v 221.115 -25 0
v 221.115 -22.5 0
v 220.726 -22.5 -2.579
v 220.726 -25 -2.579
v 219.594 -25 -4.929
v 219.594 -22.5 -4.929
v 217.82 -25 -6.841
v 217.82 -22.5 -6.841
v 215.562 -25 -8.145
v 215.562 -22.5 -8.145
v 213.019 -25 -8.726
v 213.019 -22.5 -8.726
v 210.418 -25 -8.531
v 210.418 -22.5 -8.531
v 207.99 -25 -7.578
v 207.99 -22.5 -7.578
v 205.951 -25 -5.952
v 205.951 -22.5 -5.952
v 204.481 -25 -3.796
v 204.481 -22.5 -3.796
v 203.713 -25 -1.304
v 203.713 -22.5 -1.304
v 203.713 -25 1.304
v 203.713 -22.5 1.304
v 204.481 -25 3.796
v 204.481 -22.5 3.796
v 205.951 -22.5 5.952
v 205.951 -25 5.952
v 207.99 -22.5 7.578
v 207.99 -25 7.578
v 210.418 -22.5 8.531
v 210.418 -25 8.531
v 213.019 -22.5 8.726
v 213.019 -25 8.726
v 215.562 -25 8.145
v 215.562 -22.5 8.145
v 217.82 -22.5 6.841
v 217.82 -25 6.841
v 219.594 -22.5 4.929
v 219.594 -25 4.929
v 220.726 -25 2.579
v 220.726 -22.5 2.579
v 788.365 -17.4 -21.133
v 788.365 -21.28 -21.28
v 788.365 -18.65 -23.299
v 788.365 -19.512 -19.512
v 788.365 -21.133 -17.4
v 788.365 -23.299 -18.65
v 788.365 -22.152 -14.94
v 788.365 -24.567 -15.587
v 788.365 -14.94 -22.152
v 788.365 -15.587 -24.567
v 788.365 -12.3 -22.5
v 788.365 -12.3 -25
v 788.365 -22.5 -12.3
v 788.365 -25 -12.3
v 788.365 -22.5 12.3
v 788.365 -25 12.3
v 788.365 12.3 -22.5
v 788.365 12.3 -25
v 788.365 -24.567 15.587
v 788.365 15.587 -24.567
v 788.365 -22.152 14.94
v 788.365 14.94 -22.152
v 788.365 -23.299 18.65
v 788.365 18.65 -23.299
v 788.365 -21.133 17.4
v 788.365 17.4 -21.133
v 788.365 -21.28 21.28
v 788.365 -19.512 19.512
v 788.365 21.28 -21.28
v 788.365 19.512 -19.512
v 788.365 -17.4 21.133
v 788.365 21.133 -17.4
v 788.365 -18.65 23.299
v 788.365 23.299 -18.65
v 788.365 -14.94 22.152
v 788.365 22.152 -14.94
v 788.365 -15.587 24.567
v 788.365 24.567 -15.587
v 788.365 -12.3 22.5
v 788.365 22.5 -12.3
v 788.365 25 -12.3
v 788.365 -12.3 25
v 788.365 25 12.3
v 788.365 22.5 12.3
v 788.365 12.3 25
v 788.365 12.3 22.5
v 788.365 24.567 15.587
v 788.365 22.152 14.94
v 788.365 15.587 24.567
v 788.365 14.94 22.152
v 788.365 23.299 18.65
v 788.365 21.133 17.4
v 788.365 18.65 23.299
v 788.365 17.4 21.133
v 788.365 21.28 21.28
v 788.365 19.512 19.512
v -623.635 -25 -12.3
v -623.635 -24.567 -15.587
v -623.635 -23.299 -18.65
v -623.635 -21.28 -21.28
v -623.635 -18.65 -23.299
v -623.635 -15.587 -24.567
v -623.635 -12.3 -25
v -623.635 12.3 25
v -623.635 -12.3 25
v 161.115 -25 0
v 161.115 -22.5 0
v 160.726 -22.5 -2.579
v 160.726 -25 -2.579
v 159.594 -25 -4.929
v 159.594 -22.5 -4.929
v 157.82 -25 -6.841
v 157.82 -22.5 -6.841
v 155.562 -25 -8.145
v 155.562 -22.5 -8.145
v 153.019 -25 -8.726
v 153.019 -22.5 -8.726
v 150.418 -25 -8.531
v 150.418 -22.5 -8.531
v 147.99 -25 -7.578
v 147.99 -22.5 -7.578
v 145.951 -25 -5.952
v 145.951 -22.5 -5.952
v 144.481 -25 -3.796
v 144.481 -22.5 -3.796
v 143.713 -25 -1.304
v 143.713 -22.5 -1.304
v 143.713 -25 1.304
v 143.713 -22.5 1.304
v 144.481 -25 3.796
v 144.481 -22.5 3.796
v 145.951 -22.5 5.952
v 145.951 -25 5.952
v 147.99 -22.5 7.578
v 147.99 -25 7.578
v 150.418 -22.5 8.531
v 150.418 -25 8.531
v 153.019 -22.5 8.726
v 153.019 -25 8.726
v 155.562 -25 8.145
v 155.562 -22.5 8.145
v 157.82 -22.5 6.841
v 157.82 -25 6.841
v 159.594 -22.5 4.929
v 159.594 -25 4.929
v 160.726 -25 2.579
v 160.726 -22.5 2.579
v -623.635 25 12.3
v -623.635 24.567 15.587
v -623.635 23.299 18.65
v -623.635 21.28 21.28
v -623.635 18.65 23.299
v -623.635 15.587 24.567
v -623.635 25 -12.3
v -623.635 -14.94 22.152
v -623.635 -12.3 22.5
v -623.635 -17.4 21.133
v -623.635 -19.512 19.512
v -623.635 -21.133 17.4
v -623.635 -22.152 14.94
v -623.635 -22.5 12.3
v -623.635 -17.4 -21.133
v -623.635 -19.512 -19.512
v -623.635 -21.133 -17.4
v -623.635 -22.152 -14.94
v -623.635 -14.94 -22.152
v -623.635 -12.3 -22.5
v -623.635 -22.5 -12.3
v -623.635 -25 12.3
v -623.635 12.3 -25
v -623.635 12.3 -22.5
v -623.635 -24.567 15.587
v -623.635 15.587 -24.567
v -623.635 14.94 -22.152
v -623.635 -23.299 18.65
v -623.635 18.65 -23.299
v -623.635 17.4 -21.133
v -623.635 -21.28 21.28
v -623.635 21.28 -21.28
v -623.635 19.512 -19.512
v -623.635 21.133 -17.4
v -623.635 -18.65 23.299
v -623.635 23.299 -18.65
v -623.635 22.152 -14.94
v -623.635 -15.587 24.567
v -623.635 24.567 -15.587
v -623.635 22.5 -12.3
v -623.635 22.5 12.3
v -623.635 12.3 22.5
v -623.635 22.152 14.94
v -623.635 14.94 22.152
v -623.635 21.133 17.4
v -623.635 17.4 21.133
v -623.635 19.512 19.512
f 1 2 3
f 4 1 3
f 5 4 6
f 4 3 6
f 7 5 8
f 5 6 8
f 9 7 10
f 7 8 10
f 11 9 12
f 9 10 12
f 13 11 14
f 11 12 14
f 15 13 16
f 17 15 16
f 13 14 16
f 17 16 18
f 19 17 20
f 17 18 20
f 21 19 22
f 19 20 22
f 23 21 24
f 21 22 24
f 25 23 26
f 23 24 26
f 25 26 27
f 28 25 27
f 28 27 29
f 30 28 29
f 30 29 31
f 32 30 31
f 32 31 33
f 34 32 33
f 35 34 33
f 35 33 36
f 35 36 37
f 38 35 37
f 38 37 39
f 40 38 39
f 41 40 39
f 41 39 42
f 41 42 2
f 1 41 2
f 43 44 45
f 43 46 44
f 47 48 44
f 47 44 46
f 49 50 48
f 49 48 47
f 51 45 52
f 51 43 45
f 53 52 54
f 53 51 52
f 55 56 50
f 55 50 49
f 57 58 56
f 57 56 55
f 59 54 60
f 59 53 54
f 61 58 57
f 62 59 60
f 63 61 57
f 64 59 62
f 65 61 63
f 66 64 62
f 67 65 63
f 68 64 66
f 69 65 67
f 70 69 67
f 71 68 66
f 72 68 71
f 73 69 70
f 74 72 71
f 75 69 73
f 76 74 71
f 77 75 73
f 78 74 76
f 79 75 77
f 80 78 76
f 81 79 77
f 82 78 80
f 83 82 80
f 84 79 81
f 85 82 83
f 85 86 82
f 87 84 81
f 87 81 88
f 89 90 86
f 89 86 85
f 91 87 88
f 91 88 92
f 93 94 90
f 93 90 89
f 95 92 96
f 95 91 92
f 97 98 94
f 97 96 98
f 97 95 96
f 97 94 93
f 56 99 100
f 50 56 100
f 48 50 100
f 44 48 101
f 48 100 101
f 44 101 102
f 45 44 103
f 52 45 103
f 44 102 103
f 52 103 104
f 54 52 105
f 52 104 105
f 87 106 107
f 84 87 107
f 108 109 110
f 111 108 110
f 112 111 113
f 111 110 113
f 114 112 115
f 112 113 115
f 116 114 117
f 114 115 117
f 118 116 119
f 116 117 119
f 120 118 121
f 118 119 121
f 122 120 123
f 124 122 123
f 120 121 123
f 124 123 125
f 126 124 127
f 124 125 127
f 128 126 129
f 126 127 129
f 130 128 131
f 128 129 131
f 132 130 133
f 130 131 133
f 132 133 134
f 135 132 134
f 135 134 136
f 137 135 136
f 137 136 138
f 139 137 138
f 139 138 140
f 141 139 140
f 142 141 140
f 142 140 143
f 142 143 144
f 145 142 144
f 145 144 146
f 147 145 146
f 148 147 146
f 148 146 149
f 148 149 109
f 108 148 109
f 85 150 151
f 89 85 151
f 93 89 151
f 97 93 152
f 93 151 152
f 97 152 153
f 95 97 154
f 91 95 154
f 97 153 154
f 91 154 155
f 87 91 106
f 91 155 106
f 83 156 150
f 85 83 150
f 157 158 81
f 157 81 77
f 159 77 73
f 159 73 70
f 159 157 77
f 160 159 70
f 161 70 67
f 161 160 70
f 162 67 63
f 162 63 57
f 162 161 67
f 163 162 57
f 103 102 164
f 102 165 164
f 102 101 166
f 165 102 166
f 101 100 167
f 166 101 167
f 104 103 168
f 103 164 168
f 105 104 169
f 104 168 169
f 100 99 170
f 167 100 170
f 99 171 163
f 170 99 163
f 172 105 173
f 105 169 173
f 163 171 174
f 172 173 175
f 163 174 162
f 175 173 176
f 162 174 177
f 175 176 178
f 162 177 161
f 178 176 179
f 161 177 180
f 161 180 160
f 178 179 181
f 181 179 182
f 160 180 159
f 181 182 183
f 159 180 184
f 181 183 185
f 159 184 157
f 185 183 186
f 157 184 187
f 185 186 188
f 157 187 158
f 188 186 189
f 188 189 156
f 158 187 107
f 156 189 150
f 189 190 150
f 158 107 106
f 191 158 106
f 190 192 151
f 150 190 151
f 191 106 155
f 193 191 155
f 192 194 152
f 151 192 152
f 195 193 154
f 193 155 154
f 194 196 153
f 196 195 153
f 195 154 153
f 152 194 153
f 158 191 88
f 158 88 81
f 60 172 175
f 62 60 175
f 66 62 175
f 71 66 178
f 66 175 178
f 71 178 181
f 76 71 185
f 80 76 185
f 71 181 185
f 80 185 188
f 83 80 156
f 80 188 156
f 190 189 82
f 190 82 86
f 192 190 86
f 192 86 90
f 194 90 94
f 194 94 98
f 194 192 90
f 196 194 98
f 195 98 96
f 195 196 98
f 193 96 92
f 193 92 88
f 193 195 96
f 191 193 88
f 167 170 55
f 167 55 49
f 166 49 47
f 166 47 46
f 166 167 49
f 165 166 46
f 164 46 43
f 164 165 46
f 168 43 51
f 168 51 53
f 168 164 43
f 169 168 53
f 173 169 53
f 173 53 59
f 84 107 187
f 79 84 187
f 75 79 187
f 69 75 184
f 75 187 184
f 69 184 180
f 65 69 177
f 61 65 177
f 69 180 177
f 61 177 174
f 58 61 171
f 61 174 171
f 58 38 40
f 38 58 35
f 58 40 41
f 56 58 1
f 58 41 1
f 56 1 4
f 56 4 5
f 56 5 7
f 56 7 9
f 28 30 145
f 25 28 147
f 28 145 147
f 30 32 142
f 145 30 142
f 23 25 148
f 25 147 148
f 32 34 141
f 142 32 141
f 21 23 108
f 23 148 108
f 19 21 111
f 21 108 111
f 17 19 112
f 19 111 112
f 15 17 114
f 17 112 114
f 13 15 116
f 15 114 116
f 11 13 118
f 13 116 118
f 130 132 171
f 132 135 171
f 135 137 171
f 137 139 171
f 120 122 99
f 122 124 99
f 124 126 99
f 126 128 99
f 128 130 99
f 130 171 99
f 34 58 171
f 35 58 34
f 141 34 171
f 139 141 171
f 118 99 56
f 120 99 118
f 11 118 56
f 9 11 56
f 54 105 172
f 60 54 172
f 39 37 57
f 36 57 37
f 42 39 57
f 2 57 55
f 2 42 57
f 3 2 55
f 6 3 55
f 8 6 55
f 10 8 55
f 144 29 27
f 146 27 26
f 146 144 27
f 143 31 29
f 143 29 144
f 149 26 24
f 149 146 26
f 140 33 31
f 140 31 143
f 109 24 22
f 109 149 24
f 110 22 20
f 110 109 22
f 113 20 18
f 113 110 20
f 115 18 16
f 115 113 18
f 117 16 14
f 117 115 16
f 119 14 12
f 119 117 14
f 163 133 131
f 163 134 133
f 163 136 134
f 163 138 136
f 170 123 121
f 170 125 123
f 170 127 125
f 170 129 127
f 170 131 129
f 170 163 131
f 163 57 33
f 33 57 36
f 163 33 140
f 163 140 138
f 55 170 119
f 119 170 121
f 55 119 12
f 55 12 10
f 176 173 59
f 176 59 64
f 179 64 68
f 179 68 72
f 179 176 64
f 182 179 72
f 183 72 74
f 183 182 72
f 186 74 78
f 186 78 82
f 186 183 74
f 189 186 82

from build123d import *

# Parameters (mm, degrees)
MIEMBRO_ESTRUCTURAL1_DEPTH        = 1412
TALADRO_DE_MARGEN_PARA_M161_D     = 17.5
TALADRO_DE_MARGEN_PARA_M161_DEPTH = 2.5


with BuildPart() as part:
    # Sketch1 → Miembro estructural1 (new body)
    with BuildSketch(Plane.YZ.offset(-623.635182539)):
        with BuildLine():
            Line((-12.3, -25), (12.3, -25))
            ThreePointArc((12.3, -25), (21.280256121, -21.280256121), (25, -12.3))
            Line((25, -12.3), (25, 12.3))
            ThreePointArc((25, 12.3), (21.280256121, 21.280256121), (12.3, 25))
            Line((12.3, 25), (-12.3, 25))
            ThreePointArc((-12.3, 25), (-21.280256121, 21.280256121), (-25, 12.3))
            Line((-25, 12.3), (-25, -12.3))
            ThreePointArc((-25, -12.3), (-21.280256121, -21.280256121), (-12.3, -25))
        make_face()
        with BuildLine():
            Line((-12.3, -22.5), (12.3, -22.5))
            ThreePointArc((12.3, -22.5), (19.512489168, -19.512489168), (22.5, -12.3))
            Line((22.5, -12.3), (22.5, 12.3))
            ThreePointArc((22.5, 12.3), (19.512489168, 19.512489168), (12.3, 22.5))
            Line((12.3, 22.5), (-12.3, 22.5))
            ThreePointArc((-12.3, 22.5), (-19.512489168, 19.512489168), (-22.5, 12.3))
            Line((-22.5, 12.3), (-22.5, -12.3))
            ThreePointArc((-22.5, -12.3), (-19.512489168, -19.512489168), (-12.3, -22.5))
        make_face(mode=Mode.SUBTRACT)
    extrude(amount=MIEMBRO_ESTRUCTURAL1_DEPTH)

    # Taladro de margen para M161
    with Locations(Plane(origin=(0, -25, 0), x_dir=(-1, 0, 0), z_dir=(0, -1, 0))):
        with Locations((-152.364817461, 0), (-212.364817461, 0)):
            Hole(TALADRO_DE_MARGEN_PARA_M161_D / 2, depth=TALADRO_DE_MARGEN_PARA_M161_DEPTH)


solid = part.part
